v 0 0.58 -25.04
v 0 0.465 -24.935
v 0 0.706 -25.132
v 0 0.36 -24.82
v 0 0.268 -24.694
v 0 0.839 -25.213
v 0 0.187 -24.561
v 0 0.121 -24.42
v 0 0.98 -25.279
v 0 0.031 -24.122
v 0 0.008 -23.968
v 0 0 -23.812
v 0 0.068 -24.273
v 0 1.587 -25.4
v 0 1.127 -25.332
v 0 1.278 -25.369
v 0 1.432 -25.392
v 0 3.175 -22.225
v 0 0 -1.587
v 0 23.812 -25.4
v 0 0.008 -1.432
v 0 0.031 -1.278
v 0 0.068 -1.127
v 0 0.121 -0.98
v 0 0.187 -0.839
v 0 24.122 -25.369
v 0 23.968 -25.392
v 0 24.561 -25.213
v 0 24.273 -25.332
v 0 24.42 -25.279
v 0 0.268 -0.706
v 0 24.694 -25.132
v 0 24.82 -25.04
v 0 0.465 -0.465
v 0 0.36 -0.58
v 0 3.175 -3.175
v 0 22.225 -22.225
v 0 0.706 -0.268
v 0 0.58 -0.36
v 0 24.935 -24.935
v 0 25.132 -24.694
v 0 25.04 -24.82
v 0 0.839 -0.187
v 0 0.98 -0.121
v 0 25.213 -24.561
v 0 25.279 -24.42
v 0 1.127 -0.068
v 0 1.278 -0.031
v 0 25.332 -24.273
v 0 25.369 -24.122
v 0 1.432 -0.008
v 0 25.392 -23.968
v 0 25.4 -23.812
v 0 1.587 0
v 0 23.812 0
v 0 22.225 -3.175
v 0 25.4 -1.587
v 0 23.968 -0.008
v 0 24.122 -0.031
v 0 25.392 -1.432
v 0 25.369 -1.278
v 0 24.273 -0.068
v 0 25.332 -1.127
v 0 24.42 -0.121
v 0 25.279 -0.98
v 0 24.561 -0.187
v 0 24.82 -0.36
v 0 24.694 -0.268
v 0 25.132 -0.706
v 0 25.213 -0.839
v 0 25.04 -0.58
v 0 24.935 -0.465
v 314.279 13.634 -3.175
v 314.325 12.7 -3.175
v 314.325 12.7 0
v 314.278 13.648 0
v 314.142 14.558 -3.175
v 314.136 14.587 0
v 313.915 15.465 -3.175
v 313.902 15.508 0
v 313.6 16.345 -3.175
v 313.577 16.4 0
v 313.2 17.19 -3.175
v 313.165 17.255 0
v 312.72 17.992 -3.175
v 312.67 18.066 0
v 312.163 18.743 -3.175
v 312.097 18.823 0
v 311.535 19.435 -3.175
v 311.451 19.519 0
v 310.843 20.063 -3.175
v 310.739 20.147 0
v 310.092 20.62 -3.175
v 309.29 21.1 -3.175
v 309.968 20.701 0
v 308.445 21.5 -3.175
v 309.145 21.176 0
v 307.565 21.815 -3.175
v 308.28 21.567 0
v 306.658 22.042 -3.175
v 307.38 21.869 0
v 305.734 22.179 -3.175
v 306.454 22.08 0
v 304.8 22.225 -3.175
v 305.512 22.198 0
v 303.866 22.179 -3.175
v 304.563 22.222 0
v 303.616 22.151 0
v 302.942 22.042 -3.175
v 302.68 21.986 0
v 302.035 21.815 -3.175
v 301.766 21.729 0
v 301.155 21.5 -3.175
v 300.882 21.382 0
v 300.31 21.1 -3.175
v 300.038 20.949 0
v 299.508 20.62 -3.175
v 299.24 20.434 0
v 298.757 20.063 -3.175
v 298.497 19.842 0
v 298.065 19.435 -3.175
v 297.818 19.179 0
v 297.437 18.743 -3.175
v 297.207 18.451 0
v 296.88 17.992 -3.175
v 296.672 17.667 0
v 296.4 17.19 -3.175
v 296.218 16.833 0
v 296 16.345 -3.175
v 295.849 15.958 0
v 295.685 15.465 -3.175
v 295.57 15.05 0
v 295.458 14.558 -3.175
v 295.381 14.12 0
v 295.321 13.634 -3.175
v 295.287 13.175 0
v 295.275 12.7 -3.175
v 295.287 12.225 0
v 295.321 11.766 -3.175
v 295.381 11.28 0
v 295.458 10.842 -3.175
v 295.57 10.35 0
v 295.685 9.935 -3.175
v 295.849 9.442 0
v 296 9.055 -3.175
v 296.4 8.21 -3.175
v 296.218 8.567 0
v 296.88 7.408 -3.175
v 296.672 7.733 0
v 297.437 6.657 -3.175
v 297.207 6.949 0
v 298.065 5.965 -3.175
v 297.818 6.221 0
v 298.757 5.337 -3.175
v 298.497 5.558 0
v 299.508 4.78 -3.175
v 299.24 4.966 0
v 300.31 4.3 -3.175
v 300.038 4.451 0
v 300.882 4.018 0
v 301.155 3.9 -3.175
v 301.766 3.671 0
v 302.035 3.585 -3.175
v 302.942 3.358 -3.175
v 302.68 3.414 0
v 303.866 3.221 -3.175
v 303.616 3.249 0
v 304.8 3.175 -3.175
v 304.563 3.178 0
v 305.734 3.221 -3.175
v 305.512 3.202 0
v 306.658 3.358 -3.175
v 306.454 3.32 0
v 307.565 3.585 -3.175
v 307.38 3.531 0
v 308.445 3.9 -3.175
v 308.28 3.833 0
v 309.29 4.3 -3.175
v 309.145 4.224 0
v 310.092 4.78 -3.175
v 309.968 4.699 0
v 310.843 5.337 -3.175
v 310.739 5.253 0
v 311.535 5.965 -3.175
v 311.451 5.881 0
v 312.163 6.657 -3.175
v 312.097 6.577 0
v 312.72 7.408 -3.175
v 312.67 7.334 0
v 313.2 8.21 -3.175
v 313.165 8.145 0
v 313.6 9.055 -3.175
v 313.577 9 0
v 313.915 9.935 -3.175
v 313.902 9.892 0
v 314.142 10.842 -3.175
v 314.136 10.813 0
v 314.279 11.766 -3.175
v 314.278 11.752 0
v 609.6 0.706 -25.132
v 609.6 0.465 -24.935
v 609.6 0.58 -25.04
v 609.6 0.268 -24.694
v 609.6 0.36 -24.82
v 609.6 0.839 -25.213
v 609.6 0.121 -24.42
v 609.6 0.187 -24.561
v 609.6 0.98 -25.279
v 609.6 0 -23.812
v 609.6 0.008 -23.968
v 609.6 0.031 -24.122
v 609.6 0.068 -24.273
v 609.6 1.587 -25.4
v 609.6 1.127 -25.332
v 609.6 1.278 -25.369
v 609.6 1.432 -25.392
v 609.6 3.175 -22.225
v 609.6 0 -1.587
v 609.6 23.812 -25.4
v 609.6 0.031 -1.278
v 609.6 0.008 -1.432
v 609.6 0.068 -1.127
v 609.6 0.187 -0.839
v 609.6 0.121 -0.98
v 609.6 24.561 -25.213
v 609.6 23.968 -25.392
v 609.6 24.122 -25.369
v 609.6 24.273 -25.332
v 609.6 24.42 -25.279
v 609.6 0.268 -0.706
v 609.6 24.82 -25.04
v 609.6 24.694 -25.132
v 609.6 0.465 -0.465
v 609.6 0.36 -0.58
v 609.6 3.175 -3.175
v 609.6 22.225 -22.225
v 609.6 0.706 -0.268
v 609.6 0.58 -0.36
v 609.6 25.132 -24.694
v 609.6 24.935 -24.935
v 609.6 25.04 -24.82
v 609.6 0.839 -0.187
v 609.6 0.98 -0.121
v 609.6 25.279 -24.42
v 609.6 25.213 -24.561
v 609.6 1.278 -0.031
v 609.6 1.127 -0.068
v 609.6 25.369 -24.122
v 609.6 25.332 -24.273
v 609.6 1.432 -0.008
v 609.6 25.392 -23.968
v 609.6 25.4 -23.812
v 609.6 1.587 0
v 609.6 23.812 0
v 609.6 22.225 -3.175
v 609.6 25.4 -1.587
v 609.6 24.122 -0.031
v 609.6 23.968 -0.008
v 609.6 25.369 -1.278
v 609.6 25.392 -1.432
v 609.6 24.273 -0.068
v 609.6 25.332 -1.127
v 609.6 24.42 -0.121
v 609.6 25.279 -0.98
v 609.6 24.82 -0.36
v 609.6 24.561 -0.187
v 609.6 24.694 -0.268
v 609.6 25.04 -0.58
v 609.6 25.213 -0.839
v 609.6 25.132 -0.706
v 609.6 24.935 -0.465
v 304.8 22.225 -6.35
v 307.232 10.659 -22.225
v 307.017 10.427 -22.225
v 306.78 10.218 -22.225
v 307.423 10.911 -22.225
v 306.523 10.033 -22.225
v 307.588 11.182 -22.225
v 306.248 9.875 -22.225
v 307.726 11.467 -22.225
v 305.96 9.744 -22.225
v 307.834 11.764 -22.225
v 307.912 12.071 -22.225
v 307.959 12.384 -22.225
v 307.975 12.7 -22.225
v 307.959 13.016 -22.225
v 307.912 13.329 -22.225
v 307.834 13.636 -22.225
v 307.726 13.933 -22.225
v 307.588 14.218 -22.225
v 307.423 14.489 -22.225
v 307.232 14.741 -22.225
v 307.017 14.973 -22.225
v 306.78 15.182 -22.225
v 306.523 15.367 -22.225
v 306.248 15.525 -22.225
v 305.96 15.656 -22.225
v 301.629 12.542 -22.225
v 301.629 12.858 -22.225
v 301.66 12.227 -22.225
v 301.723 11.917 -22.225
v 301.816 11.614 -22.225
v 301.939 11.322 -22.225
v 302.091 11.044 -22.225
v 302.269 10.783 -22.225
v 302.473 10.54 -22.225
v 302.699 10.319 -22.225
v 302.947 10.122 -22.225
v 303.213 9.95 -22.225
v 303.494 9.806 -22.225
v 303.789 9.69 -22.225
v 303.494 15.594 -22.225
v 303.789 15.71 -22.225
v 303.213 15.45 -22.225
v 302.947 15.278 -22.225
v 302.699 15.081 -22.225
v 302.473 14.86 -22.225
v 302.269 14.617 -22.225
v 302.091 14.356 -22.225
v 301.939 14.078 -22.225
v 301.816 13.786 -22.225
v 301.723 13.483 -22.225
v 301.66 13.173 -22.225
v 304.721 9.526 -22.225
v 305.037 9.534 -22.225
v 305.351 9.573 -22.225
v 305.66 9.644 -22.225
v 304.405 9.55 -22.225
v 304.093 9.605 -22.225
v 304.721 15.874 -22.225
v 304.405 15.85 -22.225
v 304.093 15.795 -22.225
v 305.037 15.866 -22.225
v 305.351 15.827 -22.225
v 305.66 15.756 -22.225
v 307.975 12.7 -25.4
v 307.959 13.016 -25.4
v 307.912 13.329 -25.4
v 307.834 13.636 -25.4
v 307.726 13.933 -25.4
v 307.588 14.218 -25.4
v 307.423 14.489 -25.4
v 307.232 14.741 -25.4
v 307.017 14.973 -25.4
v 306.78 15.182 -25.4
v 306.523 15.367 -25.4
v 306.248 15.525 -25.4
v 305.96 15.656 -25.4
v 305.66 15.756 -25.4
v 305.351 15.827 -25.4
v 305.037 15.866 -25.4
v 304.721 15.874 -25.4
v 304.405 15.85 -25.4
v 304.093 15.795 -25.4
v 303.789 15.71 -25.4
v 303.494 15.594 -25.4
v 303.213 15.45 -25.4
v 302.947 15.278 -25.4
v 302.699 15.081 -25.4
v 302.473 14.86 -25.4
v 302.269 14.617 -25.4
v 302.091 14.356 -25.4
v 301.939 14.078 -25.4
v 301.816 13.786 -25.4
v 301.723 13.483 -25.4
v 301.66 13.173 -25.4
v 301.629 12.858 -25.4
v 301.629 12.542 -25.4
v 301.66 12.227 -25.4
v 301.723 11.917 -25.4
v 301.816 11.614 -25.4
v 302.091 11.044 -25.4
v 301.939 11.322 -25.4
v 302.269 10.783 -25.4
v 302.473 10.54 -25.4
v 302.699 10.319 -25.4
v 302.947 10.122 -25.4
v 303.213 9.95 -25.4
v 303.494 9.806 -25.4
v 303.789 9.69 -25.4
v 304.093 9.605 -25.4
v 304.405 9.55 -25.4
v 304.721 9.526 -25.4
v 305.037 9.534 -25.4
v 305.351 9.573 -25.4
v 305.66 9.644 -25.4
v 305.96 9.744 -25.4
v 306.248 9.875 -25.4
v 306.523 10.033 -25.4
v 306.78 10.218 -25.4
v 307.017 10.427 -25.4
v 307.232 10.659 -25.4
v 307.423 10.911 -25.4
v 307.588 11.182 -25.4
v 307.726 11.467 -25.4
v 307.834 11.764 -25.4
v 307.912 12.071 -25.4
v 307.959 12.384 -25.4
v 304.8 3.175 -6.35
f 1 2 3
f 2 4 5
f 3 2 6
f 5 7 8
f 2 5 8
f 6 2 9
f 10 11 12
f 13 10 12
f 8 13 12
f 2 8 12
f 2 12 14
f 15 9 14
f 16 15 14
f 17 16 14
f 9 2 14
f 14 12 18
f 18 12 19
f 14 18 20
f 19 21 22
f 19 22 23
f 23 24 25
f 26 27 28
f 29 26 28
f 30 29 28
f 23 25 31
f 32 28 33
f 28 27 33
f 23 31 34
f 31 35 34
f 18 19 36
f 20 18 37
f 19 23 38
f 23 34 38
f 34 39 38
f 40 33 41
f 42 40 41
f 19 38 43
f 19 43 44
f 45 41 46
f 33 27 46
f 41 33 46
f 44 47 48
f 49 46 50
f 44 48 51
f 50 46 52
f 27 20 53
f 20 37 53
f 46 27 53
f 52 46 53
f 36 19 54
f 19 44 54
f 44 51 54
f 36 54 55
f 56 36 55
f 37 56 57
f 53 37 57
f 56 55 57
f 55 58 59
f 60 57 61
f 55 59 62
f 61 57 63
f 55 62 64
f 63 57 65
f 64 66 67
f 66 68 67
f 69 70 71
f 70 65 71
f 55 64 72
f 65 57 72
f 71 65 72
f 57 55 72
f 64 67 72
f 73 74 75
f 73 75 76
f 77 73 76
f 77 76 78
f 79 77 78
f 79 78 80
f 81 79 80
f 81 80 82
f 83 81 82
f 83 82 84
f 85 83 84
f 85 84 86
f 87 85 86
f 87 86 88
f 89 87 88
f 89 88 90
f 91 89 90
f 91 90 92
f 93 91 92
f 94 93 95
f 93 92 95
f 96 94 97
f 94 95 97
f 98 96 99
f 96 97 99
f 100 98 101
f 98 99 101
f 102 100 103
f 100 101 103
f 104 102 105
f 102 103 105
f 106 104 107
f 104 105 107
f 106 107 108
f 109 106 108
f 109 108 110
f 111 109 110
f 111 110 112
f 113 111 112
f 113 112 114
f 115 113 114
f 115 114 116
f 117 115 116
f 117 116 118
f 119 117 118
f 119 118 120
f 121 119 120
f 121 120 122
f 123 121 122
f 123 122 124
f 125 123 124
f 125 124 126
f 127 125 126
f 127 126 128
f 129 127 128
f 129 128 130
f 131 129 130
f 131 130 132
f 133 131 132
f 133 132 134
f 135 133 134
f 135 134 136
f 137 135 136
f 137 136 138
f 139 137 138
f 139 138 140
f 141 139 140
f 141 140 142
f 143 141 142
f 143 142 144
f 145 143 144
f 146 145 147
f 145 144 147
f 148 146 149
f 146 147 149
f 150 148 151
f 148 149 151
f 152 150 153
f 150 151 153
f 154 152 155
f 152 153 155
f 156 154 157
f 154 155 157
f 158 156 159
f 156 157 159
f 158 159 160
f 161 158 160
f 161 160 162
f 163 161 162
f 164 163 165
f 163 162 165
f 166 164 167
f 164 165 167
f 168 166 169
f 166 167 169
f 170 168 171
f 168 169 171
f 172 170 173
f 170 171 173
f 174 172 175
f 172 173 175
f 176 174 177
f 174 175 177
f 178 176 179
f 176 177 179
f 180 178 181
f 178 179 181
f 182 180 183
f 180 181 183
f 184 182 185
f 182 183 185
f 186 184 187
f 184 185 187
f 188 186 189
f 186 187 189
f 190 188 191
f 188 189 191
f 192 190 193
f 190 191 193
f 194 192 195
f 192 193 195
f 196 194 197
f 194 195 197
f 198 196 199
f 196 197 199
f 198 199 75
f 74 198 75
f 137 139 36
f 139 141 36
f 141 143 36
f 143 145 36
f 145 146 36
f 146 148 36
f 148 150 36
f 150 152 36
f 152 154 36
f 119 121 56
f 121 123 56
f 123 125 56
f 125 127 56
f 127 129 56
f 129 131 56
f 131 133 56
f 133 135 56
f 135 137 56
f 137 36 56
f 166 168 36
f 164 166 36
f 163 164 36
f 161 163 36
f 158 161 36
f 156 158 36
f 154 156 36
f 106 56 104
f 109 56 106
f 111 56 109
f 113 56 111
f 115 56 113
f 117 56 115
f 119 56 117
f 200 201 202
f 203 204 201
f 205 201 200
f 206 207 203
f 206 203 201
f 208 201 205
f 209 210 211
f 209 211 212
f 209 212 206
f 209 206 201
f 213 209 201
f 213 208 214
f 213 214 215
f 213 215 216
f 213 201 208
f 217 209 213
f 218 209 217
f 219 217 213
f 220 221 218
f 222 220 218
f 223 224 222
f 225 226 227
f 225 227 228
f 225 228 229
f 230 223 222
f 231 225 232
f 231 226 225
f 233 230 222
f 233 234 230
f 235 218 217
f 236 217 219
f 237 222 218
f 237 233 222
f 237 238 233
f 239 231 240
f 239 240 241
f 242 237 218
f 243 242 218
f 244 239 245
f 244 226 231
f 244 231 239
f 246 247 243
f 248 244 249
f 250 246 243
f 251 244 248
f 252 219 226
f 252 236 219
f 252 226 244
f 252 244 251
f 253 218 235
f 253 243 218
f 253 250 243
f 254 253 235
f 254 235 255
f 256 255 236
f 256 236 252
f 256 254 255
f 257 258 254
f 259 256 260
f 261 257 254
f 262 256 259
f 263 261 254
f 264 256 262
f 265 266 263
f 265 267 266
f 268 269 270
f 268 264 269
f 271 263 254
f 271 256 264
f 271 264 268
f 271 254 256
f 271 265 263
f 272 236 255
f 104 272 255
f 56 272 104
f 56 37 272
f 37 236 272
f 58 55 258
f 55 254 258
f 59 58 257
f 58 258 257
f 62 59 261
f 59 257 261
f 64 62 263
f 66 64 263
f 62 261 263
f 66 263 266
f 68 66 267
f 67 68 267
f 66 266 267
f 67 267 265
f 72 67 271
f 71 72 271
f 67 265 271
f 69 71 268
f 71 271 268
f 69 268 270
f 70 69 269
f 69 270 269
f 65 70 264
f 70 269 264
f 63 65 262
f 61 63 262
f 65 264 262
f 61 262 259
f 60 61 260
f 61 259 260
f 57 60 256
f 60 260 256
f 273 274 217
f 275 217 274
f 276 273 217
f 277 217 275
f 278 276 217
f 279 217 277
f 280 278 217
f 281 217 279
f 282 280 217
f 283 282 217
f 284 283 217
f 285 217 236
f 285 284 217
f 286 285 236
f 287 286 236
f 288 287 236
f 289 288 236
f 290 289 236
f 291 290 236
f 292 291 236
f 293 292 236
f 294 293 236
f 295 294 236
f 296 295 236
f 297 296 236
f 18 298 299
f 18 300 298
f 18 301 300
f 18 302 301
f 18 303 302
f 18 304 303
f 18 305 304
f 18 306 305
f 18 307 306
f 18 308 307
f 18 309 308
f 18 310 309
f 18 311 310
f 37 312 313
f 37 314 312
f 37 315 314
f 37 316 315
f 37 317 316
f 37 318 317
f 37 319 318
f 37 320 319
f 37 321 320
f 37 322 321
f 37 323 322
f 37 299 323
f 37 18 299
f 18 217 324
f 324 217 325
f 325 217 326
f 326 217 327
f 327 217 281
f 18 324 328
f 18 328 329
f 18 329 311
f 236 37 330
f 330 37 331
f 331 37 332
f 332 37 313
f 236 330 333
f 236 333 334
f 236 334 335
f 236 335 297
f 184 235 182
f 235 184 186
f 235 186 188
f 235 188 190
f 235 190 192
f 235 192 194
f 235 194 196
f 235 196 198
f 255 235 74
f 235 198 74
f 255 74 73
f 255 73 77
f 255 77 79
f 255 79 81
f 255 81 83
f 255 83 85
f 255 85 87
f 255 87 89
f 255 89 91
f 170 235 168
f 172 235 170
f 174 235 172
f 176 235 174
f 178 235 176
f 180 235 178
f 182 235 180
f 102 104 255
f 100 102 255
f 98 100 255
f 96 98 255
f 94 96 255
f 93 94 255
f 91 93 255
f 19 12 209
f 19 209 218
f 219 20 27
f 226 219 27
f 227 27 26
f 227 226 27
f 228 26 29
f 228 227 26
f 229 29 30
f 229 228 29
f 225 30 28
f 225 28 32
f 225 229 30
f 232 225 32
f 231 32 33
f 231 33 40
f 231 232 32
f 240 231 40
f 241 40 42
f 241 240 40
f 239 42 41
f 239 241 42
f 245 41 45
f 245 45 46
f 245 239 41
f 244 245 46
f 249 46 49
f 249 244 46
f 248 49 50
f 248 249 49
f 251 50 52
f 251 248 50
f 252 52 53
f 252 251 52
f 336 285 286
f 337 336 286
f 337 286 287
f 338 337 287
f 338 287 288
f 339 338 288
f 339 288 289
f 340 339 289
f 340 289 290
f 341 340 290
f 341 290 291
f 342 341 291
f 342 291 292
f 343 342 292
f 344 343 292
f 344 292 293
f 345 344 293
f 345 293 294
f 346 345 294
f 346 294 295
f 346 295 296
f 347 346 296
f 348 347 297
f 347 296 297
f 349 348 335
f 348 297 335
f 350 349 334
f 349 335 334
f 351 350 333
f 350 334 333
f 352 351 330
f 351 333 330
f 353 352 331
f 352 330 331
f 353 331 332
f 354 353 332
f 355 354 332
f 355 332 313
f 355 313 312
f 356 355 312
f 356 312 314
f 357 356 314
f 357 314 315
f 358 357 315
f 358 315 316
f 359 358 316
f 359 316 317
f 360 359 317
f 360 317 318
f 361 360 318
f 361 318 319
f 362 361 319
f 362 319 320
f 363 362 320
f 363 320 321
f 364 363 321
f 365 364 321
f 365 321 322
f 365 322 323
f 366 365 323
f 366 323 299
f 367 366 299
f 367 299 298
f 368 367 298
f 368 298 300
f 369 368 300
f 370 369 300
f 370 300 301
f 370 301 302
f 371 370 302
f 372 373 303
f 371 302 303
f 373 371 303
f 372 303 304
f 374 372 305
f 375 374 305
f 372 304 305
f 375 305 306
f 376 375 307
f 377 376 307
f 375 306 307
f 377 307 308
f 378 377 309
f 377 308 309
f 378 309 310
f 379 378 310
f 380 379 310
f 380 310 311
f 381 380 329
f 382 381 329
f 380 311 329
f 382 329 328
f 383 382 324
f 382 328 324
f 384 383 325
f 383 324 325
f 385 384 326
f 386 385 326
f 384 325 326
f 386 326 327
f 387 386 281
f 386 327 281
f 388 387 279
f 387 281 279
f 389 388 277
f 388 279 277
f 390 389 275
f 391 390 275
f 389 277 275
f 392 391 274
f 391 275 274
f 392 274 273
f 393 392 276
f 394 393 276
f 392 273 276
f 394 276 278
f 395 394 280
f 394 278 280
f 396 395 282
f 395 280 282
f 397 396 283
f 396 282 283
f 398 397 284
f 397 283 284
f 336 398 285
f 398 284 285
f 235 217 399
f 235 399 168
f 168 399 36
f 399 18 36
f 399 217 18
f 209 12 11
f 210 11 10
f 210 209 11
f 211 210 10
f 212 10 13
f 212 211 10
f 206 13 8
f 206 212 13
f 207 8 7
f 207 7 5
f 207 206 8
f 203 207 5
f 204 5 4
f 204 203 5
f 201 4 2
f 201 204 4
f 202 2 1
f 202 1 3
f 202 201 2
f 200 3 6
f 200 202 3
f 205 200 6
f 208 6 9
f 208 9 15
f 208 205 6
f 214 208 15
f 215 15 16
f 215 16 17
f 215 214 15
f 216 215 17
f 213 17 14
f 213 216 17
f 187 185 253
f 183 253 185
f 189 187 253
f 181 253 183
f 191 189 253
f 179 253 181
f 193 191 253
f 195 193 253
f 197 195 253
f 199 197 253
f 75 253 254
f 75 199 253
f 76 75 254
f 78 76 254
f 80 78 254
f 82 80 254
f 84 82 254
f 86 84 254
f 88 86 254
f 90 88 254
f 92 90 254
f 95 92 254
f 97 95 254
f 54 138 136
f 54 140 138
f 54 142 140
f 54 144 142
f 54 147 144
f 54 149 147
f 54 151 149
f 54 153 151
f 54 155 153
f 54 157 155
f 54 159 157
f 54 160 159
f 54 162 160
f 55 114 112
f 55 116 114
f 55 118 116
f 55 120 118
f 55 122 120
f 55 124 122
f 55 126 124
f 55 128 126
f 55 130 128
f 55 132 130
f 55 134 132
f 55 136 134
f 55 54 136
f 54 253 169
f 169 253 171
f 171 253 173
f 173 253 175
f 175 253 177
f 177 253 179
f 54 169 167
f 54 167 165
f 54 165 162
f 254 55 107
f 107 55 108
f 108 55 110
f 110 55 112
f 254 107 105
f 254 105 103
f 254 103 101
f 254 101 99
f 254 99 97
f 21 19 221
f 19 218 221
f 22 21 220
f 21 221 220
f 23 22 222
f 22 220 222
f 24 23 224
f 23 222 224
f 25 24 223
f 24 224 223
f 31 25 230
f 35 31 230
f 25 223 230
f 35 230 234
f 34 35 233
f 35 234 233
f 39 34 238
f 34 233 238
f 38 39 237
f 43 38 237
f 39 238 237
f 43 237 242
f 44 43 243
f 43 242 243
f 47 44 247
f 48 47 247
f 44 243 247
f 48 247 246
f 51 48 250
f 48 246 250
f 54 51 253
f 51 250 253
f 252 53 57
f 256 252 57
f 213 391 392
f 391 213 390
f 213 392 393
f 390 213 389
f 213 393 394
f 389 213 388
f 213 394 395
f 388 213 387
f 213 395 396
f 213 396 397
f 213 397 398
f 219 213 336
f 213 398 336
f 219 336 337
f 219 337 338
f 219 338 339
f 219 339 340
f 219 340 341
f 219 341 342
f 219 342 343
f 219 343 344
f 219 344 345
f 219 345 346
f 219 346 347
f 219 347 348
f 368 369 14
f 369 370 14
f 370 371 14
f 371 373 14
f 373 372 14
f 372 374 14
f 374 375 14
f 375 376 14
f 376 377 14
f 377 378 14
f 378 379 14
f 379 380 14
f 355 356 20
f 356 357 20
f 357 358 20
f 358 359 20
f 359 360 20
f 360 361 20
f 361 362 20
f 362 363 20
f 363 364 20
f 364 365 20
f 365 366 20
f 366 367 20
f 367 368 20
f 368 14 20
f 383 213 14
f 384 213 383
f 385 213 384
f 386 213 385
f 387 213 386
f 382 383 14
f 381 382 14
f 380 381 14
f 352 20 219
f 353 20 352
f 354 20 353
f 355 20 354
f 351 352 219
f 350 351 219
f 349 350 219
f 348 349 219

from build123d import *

# Parameters (mm, degrees)
F0_W     = 25.4
F0_H     = 25.4
F0_W_2   = 19.05
F0_H_2   = 19.05
F1_DEPTH = 609.6
F2_R     = 1.5875
F3_R     = 9.525
F4_DEPTH = 6.35
F5_R     = 3.175
F6_DEPTH = 25.4


with BuildPart() as f1:
    # F0 (on Right) → F1 (new body)
    with BuildSketch(Plane.YZ):
        with Locations((12.7, -12.7)):
            Rectangle(F0_W, F0_H)
        with Locations((12.7, -12.7)):
            Rectangle(F0_W_2, F0_H_2, mode=Mode.SUBTRACT)
    extrude(amount=F1_DEPTH)

    # F2
    f2_edges = [f1.edges().sort_by_distance(p)[0] for p in [
        (304.8, 0, 0),
        (304.8, 25.4, 0),
        (304.8, 0, -25.4),
        (304.8, 25.4, -25.4),
    ]]
    fillet(f2_edges, radius=F2_R)

    # F3 (on face) → F4 (cut)
    with BuildSketch(Plane.XY):
        with Locations((304.8, 12.7)):
            Circle(F3_R)
    extrude(amount=-F4_DEPTH, mode=Mode.SUBTRACT)

    # F5 (on face) → F6 (cut)
    with BuildSketch(Plane.XY):
        with Locations((304.8, 12.7)):
            Circle(F5_R)
    extrude(amount=-F6_DEPTH, mode=Mode.SUBTRACT)


solid = f1.part
